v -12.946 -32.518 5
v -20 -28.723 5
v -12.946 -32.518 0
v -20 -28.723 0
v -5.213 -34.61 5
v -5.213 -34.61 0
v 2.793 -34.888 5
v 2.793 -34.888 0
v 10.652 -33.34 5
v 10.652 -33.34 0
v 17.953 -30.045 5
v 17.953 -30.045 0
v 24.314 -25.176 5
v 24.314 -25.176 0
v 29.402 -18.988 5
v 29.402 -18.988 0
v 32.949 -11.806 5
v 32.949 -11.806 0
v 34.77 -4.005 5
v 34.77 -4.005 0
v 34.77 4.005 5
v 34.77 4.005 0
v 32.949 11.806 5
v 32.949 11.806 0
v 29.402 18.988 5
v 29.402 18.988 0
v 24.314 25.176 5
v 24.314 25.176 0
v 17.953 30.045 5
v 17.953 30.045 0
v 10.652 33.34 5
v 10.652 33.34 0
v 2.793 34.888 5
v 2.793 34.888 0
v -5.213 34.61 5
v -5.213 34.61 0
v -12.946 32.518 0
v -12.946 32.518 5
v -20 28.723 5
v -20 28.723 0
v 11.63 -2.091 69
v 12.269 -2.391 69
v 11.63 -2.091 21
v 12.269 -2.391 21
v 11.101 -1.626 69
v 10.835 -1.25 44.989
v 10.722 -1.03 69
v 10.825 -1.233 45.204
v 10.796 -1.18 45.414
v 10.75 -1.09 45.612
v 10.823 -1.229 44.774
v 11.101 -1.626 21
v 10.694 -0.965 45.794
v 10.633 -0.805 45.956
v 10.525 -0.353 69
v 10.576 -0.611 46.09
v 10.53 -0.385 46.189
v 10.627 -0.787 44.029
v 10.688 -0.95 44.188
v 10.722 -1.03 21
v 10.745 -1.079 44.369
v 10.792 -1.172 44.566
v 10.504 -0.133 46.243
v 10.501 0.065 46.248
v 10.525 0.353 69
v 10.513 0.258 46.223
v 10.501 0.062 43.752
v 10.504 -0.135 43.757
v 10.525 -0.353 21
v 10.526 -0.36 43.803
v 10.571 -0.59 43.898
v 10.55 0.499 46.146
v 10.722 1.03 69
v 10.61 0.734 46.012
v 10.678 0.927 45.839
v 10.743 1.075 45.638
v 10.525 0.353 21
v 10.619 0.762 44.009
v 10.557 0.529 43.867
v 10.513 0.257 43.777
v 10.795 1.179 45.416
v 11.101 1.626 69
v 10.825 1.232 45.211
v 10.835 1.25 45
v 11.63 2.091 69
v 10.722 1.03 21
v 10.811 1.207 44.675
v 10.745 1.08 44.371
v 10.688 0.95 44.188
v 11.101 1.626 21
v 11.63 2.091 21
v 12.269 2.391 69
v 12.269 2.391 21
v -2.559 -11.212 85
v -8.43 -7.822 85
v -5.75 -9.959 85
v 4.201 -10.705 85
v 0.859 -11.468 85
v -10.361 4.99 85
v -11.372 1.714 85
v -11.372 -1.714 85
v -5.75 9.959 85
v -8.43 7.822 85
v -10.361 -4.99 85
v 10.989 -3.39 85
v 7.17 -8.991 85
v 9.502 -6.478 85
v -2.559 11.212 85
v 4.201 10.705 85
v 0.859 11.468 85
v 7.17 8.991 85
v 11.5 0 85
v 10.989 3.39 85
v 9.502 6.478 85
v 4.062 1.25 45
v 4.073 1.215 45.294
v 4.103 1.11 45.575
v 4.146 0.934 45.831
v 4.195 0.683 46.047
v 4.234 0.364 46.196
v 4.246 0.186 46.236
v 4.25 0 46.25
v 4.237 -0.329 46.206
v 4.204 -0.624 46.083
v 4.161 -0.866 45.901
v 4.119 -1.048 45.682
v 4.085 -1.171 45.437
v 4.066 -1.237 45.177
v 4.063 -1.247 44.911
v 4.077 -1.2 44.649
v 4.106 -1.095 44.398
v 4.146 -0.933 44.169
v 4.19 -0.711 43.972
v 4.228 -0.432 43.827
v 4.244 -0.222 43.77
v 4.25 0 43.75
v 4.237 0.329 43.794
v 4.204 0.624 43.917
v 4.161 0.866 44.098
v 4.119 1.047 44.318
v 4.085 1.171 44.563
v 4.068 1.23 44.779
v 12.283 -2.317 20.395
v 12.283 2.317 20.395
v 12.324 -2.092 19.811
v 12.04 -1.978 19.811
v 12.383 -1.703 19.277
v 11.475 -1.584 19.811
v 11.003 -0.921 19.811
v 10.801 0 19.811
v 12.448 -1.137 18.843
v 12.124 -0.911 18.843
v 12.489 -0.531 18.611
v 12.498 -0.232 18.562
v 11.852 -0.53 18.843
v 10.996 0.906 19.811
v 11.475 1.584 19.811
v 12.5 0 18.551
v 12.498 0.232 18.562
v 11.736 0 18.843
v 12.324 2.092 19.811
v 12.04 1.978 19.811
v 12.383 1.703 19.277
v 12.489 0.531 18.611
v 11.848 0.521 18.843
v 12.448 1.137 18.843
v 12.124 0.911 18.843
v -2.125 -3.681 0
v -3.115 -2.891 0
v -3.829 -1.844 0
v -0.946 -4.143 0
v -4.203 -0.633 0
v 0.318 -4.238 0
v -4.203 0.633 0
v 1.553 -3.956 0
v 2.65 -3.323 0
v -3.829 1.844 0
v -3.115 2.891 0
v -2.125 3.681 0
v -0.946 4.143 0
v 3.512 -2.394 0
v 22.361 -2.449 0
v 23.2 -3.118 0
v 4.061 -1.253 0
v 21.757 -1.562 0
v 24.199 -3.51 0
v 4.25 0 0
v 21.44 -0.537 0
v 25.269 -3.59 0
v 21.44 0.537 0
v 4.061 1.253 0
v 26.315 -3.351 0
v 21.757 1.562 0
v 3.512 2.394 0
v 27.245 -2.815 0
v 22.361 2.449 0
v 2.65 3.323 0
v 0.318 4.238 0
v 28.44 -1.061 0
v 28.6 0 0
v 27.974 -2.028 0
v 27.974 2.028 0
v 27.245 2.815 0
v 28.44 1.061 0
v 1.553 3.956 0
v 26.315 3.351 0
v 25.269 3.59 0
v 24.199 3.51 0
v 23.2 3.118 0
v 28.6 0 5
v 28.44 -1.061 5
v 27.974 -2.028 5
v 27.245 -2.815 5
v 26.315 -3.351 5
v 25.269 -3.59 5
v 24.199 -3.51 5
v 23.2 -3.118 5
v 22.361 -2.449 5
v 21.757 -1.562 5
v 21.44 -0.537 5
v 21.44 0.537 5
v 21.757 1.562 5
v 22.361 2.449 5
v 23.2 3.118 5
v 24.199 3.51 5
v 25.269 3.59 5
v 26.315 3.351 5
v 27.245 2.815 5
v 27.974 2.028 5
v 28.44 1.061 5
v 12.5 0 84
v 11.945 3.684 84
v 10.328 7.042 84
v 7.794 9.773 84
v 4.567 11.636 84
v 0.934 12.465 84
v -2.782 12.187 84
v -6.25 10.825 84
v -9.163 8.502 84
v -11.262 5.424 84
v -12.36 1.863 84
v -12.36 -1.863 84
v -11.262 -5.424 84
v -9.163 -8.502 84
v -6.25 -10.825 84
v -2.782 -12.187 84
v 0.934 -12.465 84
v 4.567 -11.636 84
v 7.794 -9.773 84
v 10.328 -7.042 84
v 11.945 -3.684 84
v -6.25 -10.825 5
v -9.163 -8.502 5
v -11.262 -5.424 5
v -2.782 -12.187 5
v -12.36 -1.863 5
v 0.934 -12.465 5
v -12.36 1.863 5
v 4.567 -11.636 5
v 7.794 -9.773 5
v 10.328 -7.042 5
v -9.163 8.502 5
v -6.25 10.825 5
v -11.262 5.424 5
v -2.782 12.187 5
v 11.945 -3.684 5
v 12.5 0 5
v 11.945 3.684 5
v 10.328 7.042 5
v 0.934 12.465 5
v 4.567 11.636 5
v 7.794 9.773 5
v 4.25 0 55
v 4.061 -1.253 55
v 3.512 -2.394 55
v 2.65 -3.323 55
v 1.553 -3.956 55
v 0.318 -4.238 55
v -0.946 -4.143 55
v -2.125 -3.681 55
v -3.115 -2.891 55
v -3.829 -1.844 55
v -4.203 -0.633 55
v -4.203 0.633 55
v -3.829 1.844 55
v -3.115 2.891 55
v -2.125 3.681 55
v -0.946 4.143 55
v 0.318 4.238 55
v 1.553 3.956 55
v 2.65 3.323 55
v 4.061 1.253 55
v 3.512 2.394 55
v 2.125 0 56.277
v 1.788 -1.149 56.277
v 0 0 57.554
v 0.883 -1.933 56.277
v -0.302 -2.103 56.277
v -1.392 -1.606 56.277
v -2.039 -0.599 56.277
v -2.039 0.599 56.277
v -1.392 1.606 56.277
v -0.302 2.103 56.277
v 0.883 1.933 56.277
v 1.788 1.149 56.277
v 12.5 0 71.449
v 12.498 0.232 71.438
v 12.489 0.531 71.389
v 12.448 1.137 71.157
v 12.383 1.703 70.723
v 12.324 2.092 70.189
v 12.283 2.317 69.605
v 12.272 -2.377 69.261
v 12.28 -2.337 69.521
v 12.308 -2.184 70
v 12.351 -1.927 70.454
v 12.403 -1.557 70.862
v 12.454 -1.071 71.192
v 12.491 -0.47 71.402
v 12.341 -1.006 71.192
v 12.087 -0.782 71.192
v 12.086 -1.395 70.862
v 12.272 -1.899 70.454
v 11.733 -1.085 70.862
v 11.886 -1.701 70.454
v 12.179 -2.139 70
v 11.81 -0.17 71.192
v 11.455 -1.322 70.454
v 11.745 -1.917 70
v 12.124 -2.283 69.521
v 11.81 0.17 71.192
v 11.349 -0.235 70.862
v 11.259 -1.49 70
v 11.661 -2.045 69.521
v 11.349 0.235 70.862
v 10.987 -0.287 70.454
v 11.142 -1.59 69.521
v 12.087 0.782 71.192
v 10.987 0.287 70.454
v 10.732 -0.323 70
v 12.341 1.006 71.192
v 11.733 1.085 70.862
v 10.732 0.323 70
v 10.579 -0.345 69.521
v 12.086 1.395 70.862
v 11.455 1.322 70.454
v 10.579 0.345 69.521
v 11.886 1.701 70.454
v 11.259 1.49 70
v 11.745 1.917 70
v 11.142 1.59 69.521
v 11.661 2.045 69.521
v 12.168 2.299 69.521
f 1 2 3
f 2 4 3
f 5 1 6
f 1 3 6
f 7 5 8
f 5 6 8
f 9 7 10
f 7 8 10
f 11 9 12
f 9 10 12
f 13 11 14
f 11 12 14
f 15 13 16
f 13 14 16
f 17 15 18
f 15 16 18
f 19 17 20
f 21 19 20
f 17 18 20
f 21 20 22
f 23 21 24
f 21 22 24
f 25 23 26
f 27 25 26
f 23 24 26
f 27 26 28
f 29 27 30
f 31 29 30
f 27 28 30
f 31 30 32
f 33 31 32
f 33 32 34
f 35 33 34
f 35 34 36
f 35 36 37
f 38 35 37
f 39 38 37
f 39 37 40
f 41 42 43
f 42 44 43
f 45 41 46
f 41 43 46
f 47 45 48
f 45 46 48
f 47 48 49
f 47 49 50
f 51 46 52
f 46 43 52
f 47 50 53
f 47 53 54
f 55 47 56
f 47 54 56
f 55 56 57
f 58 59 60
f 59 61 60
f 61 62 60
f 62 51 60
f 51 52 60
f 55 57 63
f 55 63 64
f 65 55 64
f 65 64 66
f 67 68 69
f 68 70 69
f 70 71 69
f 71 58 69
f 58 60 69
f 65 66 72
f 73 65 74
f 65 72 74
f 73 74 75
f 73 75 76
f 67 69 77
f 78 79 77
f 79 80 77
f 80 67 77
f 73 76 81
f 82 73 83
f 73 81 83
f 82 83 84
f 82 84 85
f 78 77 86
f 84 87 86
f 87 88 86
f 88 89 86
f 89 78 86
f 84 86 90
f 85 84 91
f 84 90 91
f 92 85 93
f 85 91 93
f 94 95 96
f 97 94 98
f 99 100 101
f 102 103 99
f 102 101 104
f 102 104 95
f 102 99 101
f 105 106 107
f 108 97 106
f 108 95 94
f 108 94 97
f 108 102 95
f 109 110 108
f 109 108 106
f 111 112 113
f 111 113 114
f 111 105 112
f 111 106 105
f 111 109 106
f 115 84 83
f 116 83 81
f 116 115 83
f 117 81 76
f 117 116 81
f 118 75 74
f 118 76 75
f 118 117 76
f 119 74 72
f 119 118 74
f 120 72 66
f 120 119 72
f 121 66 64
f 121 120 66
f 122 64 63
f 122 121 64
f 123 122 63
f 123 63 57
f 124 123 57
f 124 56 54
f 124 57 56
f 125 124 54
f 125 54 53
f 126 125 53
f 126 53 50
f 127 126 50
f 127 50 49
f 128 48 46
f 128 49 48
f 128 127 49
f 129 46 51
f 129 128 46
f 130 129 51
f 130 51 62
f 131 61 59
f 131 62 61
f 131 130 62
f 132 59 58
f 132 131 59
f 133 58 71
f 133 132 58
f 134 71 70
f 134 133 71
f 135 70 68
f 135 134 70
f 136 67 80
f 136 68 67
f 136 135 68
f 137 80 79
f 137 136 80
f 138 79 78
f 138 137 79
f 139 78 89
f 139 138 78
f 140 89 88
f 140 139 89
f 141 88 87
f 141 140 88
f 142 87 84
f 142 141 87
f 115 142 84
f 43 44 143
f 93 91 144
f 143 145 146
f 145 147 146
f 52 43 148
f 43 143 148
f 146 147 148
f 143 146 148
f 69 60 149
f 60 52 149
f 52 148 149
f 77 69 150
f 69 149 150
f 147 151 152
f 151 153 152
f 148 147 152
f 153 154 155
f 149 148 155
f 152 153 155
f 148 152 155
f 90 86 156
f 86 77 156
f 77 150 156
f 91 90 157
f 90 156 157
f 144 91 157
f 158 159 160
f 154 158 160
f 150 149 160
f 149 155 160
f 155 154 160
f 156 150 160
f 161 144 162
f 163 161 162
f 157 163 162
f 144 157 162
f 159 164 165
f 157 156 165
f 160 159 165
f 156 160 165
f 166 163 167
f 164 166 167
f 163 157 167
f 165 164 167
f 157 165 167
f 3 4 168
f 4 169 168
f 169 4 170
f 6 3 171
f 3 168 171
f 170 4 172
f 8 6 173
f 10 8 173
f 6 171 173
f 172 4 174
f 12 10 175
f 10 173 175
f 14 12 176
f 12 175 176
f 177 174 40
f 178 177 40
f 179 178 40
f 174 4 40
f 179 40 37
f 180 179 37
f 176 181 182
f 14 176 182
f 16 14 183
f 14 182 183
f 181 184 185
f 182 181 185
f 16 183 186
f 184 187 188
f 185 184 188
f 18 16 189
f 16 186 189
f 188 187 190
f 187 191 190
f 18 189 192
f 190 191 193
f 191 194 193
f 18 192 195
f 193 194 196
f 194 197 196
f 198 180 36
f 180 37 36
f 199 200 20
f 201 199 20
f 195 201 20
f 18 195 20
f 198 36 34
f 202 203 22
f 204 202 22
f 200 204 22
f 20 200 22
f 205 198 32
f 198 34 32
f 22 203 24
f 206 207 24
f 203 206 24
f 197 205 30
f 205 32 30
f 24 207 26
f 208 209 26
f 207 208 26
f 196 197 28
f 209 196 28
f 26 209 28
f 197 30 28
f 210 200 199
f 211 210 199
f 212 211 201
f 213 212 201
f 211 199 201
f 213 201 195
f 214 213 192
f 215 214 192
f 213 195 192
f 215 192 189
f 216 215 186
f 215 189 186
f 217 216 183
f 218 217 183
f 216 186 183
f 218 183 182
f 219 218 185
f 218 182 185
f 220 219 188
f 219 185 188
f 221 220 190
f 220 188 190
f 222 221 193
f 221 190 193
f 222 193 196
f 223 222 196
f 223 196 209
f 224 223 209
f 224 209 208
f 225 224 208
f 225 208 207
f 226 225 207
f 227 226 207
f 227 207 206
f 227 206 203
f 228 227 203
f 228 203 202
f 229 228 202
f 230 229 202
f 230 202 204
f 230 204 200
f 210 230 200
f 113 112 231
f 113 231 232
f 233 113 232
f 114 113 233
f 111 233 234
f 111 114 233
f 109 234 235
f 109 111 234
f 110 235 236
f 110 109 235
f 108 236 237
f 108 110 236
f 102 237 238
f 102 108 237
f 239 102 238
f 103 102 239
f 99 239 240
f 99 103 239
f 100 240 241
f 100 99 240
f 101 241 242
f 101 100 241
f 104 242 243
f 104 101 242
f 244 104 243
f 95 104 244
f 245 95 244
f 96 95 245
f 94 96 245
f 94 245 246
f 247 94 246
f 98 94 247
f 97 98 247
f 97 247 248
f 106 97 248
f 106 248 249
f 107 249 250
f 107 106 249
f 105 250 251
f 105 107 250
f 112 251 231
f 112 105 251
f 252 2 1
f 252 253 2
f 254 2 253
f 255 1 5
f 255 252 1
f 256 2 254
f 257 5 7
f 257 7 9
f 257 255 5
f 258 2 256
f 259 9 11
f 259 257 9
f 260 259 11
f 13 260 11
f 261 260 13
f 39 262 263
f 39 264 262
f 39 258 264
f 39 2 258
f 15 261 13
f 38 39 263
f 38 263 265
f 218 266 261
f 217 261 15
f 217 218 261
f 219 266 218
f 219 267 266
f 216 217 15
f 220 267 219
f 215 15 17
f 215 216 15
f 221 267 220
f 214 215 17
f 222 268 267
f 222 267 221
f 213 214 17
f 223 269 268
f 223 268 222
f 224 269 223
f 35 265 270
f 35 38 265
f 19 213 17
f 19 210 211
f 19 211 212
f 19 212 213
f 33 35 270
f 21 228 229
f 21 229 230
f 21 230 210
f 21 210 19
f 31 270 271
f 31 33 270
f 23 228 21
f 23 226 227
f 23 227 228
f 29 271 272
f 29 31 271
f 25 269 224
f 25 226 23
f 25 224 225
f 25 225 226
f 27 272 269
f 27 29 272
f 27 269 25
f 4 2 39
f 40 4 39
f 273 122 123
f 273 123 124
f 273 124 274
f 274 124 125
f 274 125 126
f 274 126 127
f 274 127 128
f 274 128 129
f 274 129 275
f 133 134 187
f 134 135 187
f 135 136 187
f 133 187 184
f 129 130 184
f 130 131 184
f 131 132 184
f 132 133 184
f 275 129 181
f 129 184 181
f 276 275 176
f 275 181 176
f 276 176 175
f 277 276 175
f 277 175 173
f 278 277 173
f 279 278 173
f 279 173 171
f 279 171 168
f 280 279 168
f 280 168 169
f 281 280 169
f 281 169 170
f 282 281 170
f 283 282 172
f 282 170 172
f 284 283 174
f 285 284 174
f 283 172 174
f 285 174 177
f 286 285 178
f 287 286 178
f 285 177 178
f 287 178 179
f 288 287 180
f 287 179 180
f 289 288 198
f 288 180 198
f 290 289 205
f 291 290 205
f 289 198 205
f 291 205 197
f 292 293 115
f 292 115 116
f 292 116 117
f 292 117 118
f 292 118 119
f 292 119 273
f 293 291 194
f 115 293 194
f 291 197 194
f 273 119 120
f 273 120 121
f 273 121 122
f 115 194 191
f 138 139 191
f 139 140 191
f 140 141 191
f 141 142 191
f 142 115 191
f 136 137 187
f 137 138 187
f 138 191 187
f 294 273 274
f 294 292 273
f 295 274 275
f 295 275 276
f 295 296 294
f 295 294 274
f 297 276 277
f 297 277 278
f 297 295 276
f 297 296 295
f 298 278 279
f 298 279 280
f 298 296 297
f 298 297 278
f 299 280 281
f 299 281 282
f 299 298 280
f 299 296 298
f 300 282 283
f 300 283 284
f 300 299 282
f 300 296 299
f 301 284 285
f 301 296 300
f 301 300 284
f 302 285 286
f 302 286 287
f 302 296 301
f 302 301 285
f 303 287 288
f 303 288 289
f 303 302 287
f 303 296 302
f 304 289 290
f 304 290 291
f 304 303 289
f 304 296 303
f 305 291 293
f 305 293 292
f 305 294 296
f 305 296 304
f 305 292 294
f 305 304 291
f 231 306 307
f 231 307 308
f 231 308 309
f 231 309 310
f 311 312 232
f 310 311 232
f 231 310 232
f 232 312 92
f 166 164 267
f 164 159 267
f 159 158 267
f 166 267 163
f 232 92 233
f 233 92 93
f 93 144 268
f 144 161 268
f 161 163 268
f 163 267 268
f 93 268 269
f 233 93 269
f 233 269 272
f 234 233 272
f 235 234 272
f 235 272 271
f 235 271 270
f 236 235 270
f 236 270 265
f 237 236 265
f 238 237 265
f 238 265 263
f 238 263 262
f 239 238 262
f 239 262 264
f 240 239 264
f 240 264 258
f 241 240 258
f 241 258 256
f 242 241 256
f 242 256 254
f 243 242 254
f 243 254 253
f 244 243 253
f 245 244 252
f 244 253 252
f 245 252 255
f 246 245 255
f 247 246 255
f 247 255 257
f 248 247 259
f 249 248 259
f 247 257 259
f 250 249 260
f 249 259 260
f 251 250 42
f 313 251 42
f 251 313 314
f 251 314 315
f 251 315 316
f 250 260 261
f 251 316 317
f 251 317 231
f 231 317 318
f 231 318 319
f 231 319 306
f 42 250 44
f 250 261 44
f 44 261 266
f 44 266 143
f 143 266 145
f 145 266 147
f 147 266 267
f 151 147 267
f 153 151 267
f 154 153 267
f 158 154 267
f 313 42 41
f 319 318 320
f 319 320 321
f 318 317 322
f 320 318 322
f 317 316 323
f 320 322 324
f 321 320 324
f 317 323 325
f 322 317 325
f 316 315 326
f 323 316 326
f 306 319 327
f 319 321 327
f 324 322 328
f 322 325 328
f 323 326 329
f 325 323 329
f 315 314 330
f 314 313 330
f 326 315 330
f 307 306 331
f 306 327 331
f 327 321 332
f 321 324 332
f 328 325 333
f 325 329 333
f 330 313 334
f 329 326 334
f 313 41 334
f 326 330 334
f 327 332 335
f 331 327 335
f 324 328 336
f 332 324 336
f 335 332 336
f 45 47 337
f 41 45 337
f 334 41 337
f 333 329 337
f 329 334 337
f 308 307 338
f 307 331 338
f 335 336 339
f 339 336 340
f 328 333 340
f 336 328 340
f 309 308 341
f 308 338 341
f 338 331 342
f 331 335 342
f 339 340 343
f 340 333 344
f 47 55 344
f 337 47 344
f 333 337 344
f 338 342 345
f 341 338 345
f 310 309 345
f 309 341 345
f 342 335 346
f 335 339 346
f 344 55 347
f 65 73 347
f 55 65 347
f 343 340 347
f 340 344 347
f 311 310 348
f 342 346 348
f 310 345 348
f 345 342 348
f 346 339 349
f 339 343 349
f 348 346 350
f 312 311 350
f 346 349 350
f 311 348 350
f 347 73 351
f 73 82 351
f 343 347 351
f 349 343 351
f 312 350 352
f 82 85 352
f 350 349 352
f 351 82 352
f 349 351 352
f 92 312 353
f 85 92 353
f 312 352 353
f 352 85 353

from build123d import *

# Parameters (mm, degrees)
SKETCH_R        = 35
PAD_DEPTH       = 5
SKETCH001_R     = 12.5
PAD001_DEPTH    = 80
SKETCH003_R     = 1.25
POCKET_DEPTH    = 35.001
SKETCH004_R     = 3.6
POCKET001_DEPTH = 85.001
SKETCH005_R     = 4.25
HOLE_DEPTH      = 55
HOLE_TIPS_R     = 4.25
CHAMFER_SIZE    = 1
SKETCH006_W     = 25.864929
SKETCH006_H     = 80.956299
POCKET002_DEPTH = 5.001


with BuildPart() as part:
    # Sketch → Pad (new body)
    with BuildSketch(Plane.XY):
        Circle(SKETCH_R)
    extrude(amount=PAD_DEPTH)

    # Sketch001 (on Face3 of Pad) → Pad001 (join)
    with BuildSketch(Plane.XY.offset(5)):
        Circle(SKETCH001_R)
    extrude(amount=PAD001_DEPTH)

    # Sketch002 (on DatumPlane) → Groove (revolve, cut)
    with BuildSketch(Plane.XZ):
        with BuildLine():
            Line((10.5, 68.999986), (10.5, 20.999986))
            ThreePointArc((10.5, 20.999986), (11.232238, 19.232228), (13, 18.5))
            Line((13, 71.5), (13, 18.5))
            ThreePointArc((13, 71.5), (11.232228, 70.767762), (10.5, 68.999986))
        make_face()
    revolve(axis=Axis((13, 0, 0), (0, 0, -1)), mode=Mode.SUBTRACT)

    # Sketch003 (on DatumPlane) → Pocket (cut, through all)
    with BuildSketch(Plane.YZ):
        with Locations((0, 45)):
            Circle(SKETCH003_R)
    extrude(amount=POCKET_DEPTH, mode=Mode.SUBTRACT)

    # Sketch004 (on Face2 of Pocket) → Pocket001 (cut, through all)
    with BuildSketch(Plane(origin=(0, 0, 0), x_dir=(1, 0, 0), z_dir=(0, 0, -1))):
        with Locations((25, 0)):
            Circle(SKETCH004_R)
    extrude(amount=-POCKET001_DEPTH, mode=Mode.SUBTRACT)

    # Sketch005 (on Face2 of Pocket001) → Hole (cut)
    with BuildSketch(Plane(origin=(0, 0, 0), x_dir=(1, 0, 0), z_dir=(0, 0, -1))):
        Circle(SKETCH005_R)
    extrude(amount=-HOLE_DEPTH, mode=Mode.SUBTRACT)

    # Hole tips → Hole tip 1 section 0
    with BuildSketch(Plane(origin=(0, 0, 55), x_dir=(1, 0, 0), z_dir=(0, 0, -1)), mode=Mode.PRIVATE) as hole_tip_1_s0:
        Circle(HOLE_TIPS_R)
    loft([hole_tip_1_s0.sketch, Vertex(0, 0, 57.553658)], mode=Mode.SUBTRACT)

    # Chamfer
    chamfer_edges = [part.edges().sort_by_distance(p)[0] for p in [
        (-12.5, 0, 85),
    ]]
    chamfer(chamfer_edges, length=CHAMFER_SIZE)

    # Sketch006 (on Face9 of Clone) → Pocket002 (cut, through all)
    with BuildSketch(Plane.XY.offset(5)):
        with Locations((-32.932464, -3.256923)):
            Rectangle(SKETCH006_W, SKETCH006_H)
    extrude(amount=-POCKET002_DEPTH, mode=Mode.SUBTRACT)


solid = part.part
